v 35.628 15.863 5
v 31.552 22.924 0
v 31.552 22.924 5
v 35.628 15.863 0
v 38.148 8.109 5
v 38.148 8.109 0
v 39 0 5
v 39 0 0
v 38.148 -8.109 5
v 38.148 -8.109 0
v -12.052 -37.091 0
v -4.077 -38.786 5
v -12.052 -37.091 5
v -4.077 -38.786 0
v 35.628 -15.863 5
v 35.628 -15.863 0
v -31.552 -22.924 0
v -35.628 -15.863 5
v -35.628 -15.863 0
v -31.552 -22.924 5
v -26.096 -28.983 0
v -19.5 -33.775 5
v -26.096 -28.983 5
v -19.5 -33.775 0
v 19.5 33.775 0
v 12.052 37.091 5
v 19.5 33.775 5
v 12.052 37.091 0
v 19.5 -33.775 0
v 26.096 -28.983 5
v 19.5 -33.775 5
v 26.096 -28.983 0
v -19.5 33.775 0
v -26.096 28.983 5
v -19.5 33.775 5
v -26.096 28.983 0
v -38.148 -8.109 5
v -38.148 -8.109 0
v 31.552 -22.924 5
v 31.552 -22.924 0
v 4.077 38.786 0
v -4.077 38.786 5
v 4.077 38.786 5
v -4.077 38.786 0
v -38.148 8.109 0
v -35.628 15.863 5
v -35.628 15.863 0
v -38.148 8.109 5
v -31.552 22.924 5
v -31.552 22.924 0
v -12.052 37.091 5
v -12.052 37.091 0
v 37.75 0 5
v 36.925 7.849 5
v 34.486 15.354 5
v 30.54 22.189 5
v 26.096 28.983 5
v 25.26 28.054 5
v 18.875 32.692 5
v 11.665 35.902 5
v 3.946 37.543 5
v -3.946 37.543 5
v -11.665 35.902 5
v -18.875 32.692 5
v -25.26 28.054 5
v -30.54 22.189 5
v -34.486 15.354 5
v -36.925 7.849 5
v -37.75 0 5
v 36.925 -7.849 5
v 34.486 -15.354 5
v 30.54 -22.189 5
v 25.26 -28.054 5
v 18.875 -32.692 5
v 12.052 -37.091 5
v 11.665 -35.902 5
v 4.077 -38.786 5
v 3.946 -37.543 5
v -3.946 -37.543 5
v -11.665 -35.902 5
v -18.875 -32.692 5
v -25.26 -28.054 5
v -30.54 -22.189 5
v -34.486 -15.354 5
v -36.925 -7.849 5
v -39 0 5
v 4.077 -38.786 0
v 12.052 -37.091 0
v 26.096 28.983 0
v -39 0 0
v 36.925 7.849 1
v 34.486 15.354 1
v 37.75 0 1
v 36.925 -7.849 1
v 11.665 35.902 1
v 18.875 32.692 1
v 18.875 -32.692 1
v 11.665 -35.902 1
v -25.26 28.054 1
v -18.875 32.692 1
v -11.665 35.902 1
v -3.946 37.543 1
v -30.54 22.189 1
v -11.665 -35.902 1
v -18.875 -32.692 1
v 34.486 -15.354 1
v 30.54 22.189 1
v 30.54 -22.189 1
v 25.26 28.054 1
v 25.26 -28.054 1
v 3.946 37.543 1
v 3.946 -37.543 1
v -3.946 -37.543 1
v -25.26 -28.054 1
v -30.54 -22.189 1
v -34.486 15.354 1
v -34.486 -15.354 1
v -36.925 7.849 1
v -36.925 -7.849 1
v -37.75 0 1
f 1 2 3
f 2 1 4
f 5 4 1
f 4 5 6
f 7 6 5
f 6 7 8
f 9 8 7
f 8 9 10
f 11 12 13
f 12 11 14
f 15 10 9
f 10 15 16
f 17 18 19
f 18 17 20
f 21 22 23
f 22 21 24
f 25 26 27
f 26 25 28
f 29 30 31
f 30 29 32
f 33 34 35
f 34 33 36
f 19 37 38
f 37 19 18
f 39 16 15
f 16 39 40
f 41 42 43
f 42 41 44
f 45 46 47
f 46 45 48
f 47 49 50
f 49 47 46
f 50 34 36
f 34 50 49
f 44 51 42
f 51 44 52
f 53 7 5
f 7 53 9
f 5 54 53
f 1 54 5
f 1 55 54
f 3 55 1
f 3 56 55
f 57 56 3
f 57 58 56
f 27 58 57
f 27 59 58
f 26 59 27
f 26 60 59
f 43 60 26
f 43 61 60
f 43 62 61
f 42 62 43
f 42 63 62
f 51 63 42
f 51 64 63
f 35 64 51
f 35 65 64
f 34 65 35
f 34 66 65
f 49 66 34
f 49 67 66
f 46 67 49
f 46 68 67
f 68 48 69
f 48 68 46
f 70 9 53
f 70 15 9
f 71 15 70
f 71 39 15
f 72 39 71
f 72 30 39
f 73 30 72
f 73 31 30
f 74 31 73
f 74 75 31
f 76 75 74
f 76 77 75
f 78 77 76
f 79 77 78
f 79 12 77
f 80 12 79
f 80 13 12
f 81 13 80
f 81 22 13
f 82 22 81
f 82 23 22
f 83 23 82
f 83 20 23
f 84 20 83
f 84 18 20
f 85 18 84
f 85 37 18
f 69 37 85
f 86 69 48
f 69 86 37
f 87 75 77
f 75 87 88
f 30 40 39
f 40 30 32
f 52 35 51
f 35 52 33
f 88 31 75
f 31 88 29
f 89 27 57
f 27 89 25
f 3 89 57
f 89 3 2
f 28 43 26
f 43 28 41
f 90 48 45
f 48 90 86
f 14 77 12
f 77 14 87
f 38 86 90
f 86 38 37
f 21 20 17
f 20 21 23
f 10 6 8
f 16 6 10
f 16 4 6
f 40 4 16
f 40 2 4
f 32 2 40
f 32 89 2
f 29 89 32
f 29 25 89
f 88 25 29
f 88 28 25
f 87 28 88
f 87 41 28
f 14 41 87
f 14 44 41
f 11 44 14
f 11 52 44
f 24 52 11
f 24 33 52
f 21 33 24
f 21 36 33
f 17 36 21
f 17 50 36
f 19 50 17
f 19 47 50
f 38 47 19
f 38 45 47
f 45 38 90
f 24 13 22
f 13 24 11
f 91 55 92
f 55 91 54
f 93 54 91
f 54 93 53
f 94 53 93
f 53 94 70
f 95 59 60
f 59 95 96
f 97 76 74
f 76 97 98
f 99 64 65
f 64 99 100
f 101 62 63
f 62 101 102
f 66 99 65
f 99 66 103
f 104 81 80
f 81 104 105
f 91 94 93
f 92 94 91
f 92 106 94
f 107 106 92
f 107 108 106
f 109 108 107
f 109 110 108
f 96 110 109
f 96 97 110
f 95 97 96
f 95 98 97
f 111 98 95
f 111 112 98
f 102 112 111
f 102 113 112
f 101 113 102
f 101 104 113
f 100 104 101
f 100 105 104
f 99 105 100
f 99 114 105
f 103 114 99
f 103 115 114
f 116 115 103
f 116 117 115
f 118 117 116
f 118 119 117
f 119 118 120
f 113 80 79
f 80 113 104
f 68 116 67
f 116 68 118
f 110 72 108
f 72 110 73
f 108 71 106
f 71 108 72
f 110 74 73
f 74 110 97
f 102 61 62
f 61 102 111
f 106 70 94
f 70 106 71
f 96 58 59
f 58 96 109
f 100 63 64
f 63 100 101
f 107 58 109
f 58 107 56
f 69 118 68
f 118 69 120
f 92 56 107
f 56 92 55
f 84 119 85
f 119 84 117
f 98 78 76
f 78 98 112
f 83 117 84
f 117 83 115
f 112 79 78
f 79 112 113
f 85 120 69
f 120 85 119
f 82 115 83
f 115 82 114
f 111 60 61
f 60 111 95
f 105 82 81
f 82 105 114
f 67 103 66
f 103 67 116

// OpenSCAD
// Diameter of the can / container for the lid to cover, plus a 0.5-1 mm tolerance
can_diameter = 75.5;

// Height of the main lid volume
lid_height = 1;

// Width of the lip to add around the edge of the lid
lip_width = 2.5;

// Height of the lip around the edge (total, not in addition to the main lid volume height)
lip_height = 5;


difference () {

    // Main piece
    cylinder(
        h = lip_height,
        d = can_diameter + lip_width
    );
    
    // Create the lip
    translate([
        0, 0, lid_height
    ])
        cylinder(
            h = lip_height - lid_height,
            d = can_diameter
        );
}
